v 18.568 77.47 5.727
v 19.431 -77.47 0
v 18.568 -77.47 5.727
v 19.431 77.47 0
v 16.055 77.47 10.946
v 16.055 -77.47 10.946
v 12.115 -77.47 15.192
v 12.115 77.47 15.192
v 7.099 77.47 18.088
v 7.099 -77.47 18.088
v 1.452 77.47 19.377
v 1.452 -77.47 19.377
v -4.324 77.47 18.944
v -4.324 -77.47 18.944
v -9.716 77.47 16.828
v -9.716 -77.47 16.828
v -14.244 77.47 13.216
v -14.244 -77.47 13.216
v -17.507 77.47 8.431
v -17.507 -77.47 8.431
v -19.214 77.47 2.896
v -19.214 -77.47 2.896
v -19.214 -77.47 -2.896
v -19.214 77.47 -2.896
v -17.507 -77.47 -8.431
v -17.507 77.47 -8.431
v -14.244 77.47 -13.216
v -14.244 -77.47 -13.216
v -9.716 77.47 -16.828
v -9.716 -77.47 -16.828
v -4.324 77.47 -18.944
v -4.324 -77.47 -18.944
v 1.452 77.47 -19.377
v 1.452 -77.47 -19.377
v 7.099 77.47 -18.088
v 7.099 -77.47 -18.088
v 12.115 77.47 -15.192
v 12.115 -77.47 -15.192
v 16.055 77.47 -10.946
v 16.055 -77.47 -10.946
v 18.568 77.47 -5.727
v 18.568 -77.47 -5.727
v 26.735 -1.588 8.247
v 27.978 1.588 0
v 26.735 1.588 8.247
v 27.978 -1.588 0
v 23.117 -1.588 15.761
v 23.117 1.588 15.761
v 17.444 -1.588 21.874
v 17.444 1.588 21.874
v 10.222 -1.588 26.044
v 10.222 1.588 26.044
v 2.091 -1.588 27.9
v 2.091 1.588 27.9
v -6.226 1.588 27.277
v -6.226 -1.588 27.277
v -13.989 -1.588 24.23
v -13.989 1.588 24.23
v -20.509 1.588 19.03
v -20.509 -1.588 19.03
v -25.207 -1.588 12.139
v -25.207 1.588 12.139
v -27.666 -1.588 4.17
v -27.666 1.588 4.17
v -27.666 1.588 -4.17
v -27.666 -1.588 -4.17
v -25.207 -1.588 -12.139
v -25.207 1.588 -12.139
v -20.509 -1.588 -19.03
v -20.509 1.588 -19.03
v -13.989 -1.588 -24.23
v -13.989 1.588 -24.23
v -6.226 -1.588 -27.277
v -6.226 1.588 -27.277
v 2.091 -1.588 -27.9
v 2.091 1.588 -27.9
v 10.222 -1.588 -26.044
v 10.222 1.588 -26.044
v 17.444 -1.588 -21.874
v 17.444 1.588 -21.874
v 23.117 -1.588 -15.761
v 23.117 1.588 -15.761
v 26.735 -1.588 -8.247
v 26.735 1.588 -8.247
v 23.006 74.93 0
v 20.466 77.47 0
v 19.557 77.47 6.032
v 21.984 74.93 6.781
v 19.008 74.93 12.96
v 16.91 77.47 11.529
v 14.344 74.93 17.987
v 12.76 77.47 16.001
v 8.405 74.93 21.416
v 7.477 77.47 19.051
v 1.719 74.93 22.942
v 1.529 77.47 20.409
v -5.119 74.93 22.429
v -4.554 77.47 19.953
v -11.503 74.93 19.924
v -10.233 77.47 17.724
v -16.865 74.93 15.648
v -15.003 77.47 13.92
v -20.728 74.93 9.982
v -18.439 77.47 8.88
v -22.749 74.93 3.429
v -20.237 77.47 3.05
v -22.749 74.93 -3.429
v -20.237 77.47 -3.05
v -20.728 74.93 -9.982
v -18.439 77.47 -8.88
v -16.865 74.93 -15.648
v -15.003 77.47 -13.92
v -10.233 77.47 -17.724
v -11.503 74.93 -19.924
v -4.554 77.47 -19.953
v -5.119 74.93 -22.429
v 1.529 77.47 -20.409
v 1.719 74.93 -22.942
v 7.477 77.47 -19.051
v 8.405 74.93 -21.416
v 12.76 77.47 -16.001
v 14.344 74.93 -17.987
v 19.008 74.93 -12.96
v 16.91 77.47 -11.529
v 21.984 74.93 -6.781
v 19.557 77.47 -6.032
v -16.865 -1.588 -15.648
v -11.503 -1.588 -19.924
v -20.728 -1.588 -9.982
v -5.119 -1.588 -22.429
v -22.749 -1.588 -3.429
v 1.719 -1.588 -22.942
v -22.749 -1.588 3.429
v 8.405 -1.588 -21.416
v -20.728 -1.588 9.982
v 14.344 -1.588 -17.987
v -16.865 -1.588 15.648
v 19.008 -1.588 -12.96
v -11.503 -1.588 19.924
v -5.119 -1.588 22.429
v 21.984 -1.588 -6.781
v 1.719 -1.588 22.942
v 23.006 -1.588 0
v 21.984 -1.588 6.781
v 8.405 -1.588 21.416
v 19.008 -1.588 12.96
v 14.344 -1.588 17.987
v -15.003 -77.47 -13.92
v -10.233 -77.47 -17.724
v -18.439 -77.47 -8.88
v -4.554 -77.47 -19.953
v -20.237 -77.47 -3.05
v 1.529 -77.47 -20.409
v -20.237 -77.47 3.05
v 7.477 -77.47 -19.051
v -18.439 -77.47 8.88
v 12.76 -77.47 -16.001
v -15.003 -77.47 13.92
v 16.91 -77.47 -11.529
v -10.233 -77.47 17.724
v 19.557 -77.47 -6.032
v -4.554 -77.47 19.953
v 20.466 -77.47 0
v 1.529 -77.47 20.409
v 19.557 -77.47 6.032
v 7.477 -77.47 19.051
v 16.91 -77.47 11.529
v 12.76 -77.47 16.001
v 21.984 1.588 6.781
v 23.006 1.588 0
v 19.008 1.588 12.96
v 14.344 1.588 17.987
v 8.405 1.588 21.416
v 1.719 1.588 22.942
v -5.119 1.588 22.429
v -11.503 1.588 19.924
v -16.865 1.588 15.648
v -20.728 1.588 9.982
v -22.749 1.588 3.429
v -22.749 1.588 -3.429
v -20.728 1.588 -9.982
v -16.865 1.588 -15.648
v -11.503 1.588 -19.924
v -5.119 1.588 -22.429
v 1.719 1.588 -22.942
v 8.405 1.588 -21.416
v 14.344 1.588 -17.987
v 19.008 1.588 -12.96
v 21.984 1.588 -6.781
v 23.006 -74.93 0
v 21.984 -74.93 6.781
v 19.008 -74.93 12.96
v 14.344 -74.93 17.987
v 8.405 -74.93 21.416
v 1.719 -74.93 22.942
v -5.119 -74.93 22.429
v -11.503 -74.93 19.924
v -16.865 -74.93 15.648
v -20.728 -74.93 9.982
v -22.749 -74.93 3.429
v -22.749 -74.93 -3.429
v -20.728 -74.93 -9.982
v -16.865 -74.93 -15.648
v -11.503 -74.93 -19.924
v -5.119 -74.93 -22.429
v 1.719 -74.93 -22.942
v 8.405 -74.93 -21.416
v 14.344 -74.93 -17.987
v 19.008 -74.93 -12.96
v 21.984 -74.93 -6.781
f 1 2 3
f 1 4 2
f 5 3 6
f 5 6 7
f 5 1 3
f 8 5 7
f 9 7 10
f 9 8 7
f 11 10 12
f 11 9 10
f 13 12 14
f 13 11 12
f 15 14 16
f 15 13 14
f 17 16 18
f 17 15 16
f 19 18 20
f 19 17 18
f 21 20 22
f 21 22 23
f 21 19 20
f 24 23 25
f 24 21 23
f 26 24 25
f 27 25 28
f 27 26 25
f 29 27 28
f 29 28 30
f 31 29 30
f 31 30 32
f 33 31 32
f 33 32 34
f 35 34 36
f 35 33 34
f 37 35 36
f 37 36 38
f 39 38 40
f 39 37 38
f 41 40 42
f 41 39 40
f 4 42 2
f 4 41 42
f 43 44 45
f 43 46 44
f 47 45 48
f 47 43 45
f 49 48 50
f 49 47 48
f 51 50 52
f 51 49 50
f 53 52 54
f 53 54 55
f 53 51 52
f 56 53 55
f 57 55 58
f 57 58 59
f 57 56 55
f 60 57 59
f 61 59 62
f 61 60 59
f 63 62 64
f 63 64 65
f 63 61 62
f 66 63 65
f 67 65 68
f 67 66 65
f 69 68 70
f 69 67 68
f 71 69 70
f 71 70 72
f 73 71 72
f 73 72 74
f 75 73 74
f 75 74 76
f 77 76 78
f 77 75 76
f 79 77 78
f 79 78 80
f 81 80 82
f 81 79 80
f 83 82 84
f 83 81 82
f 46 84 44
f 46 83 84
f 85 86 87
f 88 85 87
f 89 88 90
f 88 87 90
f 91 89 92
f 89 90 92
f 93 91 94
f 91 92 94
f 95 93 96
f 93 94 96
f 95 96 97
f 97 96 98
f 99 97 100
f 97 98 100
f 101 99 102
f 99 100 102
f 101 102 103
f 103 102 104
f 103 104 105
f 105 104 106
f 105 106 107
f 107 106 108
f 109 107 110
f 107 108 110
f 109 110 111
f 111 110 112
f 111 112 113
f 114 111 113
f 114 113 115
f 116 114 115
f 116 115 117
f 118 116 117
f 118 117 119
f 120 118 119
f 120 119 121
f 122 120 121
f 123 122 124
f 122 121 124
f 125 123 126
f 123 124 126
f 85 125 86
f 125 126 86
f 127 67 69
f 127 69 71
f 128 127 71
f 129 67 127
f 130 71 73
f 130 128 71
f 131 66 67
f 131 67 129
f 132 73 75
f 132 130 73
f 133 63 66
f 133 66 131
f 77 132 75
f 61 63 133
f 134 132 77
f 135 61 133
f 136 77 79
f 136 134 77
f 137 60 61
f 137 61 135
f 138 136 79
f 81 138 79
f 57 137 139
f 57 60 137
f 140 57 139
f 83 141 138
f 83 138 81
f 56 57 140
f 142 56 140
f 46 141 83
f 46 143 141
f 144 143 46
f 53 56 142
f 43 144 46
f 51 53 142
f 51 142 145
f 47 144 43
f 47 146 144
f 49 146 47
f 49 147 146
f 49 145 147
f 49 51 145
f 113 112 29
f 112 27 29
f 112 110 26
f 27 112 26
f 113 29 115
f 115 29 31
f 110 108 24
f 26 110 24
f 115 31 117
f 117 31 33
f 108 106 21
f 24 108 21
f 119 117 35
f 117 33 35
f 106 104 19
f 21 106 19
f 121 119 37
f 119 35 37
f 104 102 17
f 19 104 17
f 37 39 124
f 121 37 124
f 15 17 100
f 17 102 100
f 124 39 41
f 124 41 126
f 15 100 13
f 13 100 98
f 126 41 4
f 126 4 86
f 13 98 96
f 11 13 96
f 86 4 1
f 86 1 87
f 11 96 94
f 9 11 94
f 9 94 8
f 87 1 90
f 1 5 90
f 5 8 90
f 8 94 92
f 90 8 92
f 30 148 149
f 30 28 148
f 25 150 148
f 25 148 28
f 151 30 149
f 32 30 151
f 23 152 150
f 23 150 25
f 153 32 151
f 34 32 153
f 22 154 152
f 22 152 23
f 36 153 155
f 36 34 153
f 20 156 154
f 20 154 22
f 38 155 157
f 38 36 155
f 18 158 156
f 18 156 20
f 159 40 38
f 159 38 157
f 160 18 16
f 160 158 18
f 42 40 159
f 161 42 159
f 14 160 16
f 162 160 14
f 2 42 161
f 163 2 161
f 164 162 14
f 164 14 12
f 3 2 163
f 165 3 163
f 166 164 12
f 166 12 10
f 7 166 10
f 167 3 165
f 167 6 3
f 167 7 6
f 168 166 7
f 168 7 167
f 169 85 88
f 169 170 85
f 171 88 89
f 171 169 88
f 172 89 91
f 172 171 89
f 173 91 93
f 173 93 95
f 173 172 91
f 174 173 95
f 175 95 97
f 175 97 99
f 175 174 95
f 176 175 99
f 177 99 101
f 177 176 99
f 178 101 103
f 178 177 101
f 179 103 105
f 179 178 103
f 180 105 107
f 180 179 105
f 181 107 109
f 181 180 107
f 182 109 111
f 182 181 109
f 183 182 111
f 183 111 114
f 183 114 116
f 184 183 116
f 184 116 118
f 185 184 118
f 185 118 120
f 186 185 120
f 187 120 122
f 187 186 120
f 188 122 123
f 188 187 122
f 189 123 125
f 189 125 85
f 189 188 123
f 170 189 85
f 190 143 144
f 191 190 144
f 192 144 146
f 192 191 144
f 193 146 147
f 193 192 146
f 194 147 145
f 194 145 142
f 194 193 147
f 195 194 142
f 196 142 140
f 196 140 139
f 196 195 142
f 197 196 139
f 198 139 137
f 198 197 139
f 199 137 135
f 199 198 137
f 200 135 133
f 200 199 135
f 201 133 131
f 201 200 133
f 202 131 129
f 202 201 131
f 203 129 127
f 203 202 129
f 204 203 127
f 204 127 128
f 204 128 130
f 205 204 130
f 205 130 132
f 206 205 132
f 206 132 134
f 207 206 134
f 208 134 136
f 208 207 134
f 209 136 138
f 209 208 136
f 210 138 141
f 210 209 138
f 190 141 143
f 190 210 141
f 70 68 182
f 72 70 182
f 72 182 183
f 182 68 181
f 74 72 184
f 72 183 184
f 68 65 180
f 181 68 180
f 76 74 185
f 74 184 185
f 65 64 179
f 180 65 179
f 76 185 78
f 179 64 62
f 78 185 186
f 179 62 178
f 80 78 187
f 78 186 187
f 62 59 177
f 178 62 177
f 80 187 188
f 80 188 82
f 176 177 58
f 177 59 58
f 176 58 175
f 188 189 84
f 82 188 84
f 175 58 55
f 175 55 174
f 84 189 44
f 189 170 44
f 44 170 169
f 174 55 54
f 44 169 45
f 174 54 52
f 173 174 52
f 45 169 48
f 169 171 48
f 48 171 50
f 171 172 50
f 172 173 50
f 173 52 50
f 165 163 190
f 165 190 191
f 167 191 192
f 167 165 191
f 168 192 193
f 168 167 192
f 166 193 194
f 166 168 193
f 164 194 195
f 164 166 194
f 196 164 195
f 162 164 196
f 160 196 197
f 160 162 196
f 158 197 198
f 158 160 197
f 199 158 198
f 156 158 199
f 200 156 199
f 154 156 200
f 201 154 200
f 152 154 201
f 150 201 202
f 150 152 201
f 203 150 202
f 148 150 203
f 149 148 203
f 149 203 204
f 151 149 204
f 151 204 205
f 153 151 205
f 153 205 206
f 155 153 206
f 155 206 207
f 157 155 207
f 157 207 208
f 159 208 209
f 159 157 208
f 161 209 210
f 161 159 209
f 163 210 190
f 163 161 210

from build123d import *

# Parameters (mm, degrees)
F0_R     = 23.00605
F0_R_2   = 19.431
F1_DEPTH = 77.47
F2_SIZE  = 2.54
F0_R_3   = 27.9781
F3_DEPTH = 1.5875


with BuildPart() as f1:
    # F0 (on Front) → F1 (new body, symmetric)
    with BuildSketch(Plane.XZ):
        Circle(F0_R)
        Circle(F0_R_2, mode=Mode.SUBTRACT)
    extrude(amount=F1_DEPTH, both=True)

    # F2
    f2_edges = [f1.edges().sort_by_distance(p)[0] for p in [
        (-23.00605, -77.47, 0),
        (-23.00605, 77.47, 0),
    ]]
    chamfer(f2_edges, length=F2_SIZE)

    # F0 (on Front) → F3 (join, symmetric)
    with BuildSketch(Plane.XZ):
        Circle(F0_R_3)
        Circle(F0_R, mode=Mode.SUBTRACT)
    extrude(amount=F3_DEPTH, both=True)


solid = f1.part
